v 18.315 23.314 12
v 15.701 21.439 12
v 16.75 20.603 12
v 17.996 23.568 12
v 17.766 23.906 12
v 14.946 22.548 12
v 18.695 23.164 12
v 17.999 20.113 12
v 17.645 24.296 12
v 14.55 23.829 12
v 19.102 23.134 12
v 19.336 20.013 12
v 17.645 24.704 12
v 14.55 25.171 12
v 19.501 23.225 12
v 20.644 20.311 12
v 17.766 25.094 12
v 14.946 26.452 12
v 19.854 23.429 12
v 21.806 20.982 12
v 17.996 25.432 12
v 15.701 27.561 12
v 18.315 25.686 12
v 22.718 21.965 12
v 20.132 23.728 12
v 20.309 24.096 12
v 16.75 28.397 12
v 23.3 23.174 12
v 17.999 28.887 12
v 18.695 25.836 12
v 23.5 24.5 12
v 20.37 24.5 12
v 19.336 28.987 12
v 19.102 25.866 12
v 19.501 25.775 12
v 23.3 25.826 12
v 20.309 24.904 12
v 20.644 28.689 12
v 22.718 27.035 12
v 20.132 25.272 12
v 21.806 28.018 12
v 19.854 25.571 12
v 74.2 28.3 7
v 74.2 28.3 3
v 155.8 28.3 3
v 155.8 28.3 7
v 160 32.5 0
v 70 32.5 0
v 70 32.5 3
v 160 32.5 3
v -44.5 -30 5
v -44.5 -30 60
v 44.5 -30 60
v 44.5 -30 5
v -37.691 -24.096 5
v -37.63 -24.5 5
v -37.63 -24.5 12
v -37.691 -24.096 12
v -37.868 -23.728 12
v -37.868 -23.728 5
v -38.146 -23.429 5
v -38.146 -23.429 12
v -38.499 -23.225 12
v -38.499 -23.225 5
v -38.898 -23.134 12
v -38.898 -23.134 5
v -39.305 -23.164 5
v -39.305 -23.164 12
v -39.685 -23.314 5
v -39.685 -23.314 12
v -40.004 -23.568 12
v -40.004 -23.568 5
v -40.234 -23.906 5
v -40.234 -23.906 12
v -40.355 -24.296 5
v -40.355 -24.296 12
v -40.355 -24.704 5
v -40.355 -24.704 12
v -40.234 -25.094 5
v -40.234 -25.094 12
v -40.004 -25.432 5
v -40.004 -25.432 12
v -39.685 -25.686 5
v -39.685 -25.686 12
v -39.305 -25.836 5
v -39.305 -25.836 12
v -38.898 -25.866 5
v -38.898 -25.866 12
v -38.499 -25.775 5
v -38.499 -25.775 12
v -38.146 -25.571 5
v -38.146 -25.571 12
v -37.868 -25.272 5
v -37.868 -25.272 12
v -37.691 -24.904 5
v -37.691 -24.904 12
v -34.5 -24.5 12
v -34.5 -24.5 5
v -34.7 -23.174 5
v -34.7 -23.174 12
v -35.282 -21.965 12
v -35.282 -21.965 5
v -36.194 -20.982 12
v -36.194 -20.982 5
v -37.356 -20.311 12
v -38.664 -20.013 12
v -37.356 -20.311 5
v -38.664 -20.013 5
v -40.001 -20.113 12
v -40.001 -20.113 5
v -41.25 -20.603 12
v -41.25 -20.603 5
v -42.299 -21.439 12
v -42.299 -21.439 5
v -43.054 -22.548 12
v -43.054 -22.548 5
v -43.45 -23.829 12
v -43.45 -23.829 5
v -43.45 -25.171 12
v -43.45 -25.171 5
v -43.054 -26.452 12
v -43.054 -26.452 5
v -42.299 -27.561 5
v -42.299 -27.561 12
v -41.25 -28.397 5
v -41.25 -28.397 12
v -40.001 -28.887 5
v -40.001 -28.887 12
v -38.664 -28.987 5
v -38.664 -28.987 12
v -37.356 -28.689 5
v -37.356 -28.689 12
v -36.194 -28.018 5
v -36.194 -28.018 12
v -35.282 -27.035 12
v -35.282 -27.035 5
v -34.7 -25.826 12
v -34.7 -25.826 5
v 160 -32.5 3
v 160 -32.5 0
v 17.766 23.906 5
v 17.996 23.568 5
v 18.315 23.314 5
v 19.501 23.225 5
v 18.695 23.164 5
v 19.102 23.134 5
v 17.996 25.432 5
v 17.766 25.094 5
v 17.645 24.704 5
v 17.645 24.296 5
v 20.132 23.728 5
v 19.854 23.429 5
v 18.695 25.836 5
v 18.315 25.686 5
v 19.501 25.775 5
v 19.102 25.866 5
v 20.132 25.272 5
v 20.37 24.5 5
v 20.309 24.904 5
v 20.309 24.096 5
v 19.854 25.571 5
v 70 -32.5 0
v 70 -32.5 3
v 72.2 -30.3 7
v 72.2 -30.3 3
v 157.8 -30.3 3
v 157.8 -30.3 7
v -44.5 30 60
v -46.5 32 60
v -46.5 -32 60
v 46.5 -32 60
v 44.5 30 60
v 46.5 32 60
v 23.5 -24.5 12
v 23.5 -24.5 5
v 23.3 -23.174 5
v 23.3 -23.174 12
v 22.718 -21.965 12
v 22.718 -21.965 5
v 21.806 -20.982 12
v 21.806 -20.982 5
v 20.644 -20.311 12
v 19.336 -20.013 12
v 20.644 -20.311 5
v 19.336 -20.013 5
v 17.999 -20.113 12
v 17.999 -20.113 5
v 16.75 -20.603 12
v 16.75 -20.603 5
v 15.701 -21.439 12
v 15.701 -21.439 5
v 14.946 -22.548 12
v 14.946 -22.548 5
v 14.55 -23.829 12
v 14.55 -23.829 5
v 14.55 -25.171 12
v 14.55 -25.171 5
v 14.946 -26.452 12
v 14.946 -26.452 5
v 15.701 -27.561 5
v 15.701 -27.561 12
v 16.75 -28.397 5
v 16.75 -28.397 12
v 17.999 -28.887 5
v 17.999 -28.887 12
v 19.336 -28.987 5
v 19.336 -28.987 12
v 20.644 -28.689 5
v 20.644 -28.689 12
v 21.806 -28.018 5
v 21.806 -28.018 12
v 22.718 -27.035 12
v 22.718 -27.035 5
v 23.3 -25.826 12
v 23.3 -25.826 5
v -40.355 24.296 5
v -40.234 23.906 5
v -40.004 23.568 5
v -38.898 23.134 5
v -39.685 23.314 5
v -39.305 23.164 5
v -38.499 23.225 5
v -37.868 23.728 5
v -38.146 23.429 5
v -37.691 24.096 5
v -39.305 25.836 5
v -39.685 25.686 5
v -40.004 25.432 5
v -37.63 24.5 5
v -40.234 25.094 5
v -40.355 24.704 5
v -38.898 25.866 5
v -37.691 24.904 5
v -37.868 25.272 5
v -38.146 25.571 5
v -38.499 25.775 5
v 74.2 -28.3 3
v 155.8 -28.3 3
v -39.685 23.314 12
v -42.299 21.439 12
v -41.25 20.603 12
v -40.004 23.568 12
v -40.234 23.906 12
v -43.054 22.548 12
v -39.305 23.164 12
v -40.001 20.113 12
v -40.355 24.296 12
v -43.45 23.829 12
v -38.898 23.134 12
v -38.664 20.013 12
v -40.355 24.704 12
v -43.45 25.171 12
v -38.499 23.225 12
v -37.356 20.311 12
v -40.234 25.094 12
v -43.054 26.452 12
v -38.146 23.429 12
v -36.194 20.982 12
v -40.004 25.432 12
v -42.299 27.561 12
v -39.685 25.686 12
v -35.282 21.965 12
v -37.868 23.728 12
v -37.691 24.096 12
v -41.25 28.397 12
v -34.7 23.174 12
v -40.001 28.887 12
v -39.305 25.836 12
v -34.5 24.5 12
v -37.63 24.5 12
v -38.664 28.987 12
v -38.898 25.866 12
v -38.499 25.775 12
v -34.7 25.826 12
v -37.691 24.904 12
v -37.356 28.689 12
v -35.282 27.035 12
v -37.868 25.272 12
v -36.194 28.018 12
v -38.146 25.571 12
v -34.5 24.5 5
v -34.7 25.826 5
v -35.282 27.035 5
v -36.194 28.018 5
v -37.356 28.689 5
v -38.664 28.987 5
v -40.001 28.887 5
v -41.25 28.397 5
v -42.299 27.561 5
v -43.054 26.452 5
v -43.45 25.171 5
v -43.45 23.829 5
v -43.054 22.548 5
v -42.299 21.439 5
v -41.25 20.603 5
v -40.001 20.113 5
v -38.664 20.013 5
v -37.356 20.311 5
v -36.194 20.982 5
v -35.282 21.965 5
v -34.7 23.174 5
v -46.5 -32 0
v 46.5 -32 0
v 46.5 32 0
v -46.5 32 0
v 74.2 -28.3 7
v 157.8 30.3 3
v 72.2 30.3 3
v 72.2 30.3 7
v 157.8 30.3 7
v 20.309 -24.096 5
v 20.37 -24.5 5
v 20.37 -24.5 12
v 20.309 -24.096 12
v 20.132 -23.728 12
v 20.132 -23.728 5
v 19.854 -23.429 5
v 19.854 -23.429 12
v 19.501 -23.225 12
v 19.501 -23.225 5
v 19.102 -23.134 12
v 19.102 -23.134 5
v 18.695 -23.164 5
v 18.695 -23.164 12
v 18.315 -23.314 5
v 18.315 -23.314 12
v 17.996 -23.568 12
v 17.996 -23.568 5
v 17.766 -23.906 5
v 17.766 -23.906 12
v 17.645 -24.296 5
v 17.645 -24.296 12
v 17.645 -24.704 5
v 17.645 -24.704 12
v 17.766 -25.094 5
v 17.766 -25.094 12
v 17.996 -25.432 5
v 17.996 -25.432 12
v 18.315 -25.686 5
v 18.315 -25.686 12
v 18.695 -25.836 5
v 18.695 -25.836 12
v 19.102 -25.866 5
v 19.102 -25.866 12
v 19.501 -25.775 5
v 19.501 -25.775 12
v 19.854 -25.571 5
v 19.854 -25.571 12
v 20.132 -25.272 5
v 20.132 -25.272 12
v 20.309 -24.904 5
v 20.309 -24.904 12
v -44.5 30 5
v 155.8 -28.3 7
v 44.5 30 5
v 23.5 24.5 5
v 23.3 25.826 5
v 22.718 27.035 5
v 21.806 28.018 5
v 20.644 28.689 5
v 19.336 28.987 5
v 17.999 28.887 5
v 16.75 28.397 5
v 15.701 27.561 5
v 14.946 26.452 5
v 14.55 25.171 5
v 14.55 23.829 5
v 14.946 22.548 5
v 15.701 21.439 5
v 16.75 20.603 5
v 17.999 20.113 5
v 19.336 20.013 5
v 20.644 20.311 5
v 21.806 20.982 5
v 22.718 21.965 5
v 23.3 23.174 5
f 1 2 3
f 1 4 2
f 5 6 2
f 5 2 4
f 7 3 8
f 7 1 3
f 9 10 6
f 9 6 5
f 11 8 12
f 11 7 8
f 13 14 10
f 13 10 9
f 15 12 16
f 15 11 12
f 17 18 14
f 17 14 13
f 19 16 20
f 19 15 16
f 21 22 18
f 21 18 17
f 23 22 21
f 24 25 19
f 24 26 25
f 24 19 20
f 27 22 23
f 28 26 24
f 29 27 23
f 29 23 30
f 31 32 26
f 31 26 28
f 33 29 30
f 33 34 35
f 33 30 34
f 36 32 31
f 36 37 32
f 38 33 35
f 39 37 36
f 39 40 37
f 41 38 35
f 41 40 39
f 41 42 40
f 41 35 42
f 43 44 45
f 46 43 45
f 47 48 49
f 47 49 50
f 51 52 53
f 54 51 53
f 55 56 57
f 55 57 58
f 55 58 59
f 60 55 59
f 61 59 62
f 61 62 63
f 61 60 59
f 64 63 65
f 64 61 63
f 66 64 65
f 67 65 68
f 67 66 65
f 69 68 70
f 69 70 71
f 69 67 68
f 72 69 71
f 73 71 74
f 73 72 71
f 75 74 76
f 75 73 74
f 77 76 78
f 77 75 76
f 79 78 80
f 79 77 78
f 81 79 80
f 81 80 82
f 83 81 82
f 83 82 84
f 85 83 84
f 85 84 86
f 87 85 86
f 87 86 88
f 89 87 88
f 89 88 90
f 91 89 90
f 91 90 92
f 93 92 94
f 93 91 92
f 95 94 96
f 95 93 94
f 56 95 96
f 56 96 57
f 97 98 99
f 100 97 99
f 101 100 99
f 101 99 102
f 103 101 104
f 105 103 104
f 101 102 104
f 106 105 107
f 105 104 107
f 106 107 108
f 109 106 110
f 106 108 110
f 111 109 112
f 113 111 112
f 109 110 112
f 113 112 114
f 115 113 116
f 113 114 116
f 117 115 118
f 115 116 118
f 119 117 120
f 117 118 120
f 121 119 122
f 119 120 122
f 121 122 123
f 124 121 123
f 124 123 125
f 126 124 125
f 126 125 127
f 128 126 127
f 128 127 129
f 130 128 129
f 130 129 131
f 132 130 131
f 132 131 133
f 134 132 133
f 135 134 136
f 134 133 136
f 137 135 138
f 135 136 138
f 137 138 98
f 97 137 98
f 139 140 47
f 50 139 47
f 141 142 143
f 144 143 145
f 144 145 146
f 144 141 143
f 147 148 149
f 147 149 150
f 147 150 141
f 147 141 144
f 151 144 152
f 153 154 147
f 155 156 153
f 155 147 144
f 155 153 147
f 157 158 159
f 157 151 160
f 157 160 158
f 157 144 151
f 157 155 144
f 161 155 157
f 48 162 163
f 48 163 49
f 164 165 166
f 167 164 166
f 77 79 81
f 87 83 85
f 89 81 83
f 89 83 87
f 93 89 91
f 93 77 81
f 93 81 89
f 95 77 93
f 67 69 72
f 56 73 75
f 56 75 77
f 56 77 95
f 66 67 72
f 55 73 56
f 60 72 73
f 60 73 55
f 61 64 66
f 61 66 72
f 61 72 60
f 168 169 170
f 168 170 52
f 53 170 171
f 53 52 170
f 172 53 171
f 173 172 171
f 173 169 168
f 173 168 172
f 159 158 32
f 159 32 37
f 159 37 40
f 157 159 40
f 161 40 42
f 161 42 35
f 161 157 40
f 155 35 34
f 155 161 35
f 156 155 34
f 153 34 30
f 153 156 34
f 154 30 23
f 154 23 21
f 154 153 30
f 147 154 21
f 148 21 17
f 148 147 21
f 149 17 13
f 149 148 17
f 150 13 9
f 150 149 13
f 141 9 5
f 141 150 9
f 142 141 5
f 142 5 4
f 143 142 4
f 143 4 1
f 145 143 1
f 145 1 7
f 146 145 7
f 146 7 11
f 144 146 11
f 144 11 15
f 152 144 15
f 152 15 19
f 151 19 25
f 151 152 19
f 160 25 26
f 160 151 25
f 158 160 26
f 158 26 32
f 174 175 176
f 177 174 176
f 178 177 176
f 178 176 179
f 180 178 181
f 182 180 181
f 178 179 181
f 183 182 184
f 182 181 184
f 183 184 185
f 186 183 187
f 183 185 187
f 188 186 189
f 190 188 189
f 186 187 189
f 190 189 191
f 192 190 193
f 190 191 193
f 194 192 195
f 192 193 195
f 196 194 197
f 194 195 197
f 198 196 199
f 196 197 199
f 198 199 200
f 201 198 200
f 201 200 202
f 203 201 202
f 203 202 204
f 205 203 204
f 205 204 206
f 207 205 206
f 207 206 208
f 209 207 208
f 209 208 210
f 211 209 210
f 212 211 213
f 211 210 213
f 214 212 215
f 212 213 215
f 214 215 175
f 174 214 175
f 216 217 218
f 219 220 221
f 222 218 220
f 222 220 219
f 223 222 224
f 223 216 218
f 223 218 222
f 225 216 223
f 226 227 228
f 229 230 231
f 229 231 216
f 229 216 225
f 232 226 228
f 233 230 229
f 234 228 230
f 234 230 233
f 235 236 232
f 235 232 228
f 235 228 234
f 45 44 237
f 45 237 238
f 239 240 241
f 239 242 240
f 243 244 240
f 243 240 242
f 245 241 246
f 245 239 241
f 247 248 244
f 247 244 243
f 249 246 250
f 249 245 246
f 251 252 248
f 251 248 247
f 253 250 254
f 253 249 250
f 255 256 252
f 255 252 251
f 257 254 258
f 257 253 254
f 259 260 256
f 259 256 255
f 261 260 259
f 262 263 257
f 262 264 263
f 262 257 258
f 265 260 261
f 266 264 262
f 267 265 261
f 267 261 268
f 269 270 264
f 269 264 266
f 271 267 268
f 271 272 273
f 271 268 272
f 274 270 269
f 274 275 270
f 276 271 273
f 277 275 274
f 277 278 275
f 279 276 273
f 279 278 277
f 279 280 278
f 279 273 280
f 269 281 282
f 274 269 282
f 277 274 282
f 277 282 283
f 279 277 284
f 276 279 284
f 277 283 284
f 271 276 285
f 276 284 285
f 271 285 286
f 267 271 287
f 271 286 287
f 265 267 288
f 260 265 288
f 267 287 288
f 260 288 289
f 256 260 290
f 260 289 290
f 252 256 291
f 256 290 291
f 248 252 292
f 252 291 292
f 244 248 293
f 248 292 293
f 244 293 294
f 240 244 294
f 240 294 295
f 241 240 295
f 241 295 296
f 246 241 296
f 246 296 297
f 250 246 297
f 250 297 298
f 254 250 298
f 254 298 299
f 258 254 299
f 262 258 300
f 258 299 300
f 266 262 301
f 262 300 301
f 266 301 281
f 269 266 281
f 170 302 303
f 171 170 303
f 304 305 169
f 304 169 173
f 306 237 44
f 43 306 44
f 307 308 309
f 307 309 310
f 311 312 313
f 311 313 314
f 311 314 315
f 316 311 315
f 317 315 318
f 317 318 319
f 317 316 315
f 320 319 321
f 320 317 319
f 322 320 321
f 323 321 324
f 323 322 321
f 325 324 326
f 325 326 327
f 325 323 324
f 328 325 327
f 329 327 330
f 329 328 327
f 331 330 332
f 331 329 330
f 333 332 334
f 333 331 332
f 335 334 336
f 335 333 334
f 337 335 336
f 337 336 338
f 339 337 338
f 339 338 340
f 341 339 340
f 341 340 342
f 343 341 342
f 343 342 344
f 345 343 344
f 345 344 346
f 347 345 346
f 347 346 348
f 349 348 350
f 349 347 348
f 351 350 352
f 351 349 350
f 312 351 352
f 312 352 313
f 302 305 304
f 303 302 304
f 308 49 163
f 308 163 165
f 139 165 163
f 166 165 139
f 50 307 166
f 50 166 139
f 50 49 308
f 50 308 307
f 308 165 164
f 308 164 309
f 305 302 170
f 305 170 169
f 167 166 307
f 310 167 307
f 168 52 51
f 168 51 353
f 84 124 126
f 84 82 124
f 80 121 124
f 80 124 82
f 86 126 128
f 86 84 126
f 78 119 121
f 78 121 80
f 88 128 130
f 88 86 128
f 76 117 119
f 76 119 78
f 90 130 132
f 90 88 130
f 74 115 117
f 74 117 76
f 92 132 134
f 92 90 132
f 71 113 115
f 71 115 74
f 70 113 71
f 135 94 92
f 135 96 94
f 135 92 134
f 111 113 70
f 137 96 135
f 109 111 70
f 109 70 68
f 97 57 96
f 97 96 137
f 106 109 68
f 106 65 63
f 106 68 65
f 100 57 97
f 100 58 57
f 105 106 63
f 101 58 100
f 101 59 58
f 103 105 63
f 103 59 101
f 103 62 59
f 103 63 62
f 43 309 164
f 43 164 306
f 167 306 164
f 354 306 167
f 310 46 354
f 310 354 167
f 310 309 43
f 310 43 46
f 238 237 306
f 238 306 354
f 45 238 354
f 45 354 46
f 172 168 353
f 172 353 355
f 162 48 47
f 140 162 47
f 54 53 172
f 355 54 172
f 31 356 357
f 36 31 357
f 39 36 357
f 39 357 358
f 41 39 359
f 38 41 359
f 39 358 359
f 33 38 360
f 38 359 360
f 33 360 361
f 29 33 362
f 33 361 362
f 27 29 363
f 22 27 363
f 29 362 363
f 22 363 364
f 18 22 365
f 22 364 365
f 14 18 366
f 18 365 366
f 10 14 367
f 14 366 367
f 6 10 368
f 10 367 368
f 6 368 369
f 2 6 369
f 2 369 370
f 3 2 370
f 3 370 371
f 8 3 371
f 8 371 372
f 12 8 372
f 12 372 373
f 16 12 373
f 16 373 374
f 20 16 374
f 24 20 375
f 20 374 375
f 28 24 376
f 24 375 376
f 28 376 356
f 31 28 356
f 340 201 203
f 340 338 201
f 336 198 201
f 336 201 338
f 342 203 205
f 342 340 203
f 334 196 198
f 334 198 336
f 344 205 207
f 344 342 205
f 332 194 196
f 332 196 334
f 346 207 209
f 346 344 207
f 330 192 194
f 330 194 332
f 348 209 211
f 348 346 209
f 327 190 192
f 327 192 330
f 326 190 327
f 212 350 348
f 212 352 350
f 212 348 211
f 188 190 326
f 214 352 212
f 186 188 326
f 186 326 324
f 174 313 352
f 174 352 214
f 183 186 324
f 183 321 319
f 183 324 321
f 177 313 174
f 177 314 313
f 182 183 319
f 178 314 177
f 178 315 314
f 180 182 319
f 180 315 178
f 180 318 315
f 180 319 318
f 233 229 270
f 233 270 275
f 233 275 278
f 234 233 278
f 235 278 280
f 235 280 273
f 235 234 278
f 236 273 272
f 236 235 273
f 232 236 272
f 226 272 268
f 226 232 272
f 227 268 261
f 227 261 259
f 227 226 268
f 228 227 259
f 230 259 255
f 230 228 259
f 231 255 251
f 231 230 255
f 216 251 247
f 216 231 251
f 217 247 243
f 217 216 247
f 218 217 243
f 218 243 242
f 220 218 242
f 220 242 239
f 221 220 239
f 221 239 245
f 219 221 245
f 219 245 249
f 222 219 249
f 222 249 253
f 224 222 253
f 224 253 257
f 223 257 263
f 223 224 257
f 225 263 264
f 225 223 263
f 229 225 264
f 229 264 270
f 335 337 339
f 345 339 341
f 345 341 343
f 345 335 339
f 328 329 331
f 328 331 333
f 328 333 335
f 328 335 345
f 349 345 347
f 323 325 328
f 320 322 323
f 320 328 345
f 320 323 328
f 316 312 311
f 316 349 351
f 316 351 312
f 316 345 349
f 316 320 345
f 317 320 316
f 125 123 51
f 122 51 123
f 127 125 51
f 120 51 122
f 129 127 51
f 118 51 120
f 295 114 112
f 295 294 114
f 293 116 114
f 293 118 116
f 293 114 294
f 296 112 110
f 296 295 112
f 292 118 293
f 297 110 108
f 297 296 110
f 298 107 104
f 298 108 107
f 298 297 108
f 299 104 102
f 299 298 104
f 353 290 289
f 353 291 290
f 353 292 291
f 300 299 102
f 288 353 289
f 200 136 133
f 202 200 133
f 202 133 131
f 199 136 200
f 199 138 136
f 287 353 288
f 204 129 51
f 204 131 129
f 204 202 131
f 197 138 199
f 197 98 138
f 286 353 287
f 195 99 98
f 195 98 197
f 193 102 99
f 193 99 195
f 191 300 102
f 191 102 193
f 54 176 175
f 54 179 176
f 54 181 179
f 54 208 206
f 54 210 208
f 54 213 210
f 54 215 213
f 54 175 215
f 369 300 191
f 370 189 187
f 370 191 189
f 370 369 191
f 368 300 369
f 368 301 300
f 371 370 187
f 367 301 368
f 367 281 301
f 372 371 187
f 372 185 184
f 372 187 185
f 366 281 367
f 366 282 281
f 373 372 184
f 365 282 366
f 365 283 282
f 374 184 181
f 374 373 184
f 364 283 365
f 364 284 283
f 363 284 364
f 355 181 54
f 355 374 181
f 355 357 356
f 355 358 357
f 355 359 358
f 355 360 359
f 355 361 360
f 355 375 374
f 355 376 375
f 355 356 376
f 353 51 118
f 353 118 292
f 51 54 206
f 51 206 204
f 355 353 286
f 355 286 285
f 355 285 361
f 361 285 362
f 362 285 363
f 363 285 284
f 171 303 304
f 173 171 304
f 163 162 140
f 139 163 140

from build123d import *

# Parameters (mm, degrees)
SKETCH_W      = 93
SKETCH_H      = 64
PAD_DEPTH     = 60
SKETCH001_W   = 89
SKETCH001_H   = 60
POCKET_DEPTH  = 55
SKETCH002_R   = 4.5
SKETCH002_R_2 = 1.37
PAD001_DEPTH  = 7
SKETCH003_W   = 90
SKETCH003_H   = 65
PAD002_DEPTH  = 3
SKETCH004_W   = 85.6
SKETCH004_H   = 60.6
SKETCH004_W_2 = 81.6
SKETCH004_H_2 = 56.6
PAD003_DEPTH  = 4


with BuildPart() as box_body_main:
    # Sketch → Pad (new body)
    with BuildSketch(Plane.XY):
        Rectangle(SKETCH_W, SKETCH_H)
    extrude(amount=PAD_DEPTH)

    # Sketch001 (on Face6 of Pad) → Pocket (cut)
    with BuildSketch(Plane.XY.offset(60)):
        Rectangle(SKETCH001_W, SKETCH001_H)
    extrude(amount=-POCKET_DEPTH, mode=Mode.SUBTRACT)

    # Sketch002 (on Face11 of Pocket) → Pad001 (join)
    with BuildSketch(Plane.XY.offset(5)):
        with Locations((-39, 24.5)):
            Circle(SKETCH002_R)
        with Locations((-39, 24.5)):
            Circle(SKETCH002_R_2, mode=Mode.SUBTRACT)
        with Locations((19, 24.5)):
            Circle(SKETCH002_R)
        with Locations((19, 24.5)):
            Circle(SKETCH002_R_2, mode=Mode.SUBTRACT)
        with Locations((-39, -24.5)):
            Circle(SKETCH002_R)
        with Locations((-39, -24.5)):
            Circle(SKETCH002_R_2, mode=Mode.SUBTRACT)
        with Locations((19, -24.5)):
            Circle(SKETCH002_R)
        with Locations((19, -24.5)):
            Circle(SKETCH002_R_2, mode=Mode.SUBTRACT)
    extrude(amount=PAD001_DEPTH)


with BuildPart() as cover_lid:
    # Sketch003 → Pad002 (new body)
    with BuildSketch(Plane.XY):
        with Locations((115, 0)):
            Rectangle(SKETCH003_W, SKETCH003_H)
    extrude(amount=PAD002_DEPTH)

    # Sketch004 (on Face6 of Pad002) → Pad003 (join)
    with BuildSketch(Plane.XY.offset(3)):
        with Locations((115, 0)):
            Rectangle(SKETCH004_W, SKETCH004_H)
        with Locations((115, 0)):
            Rectangle(SKETCH004_W_2, SKETCH004_H_2, mode=Mode.SUBTRACT)
    extrude(amount=PAD003_DEPTH)


solid = Compound([box_body_main.part, cover_lid.part])
